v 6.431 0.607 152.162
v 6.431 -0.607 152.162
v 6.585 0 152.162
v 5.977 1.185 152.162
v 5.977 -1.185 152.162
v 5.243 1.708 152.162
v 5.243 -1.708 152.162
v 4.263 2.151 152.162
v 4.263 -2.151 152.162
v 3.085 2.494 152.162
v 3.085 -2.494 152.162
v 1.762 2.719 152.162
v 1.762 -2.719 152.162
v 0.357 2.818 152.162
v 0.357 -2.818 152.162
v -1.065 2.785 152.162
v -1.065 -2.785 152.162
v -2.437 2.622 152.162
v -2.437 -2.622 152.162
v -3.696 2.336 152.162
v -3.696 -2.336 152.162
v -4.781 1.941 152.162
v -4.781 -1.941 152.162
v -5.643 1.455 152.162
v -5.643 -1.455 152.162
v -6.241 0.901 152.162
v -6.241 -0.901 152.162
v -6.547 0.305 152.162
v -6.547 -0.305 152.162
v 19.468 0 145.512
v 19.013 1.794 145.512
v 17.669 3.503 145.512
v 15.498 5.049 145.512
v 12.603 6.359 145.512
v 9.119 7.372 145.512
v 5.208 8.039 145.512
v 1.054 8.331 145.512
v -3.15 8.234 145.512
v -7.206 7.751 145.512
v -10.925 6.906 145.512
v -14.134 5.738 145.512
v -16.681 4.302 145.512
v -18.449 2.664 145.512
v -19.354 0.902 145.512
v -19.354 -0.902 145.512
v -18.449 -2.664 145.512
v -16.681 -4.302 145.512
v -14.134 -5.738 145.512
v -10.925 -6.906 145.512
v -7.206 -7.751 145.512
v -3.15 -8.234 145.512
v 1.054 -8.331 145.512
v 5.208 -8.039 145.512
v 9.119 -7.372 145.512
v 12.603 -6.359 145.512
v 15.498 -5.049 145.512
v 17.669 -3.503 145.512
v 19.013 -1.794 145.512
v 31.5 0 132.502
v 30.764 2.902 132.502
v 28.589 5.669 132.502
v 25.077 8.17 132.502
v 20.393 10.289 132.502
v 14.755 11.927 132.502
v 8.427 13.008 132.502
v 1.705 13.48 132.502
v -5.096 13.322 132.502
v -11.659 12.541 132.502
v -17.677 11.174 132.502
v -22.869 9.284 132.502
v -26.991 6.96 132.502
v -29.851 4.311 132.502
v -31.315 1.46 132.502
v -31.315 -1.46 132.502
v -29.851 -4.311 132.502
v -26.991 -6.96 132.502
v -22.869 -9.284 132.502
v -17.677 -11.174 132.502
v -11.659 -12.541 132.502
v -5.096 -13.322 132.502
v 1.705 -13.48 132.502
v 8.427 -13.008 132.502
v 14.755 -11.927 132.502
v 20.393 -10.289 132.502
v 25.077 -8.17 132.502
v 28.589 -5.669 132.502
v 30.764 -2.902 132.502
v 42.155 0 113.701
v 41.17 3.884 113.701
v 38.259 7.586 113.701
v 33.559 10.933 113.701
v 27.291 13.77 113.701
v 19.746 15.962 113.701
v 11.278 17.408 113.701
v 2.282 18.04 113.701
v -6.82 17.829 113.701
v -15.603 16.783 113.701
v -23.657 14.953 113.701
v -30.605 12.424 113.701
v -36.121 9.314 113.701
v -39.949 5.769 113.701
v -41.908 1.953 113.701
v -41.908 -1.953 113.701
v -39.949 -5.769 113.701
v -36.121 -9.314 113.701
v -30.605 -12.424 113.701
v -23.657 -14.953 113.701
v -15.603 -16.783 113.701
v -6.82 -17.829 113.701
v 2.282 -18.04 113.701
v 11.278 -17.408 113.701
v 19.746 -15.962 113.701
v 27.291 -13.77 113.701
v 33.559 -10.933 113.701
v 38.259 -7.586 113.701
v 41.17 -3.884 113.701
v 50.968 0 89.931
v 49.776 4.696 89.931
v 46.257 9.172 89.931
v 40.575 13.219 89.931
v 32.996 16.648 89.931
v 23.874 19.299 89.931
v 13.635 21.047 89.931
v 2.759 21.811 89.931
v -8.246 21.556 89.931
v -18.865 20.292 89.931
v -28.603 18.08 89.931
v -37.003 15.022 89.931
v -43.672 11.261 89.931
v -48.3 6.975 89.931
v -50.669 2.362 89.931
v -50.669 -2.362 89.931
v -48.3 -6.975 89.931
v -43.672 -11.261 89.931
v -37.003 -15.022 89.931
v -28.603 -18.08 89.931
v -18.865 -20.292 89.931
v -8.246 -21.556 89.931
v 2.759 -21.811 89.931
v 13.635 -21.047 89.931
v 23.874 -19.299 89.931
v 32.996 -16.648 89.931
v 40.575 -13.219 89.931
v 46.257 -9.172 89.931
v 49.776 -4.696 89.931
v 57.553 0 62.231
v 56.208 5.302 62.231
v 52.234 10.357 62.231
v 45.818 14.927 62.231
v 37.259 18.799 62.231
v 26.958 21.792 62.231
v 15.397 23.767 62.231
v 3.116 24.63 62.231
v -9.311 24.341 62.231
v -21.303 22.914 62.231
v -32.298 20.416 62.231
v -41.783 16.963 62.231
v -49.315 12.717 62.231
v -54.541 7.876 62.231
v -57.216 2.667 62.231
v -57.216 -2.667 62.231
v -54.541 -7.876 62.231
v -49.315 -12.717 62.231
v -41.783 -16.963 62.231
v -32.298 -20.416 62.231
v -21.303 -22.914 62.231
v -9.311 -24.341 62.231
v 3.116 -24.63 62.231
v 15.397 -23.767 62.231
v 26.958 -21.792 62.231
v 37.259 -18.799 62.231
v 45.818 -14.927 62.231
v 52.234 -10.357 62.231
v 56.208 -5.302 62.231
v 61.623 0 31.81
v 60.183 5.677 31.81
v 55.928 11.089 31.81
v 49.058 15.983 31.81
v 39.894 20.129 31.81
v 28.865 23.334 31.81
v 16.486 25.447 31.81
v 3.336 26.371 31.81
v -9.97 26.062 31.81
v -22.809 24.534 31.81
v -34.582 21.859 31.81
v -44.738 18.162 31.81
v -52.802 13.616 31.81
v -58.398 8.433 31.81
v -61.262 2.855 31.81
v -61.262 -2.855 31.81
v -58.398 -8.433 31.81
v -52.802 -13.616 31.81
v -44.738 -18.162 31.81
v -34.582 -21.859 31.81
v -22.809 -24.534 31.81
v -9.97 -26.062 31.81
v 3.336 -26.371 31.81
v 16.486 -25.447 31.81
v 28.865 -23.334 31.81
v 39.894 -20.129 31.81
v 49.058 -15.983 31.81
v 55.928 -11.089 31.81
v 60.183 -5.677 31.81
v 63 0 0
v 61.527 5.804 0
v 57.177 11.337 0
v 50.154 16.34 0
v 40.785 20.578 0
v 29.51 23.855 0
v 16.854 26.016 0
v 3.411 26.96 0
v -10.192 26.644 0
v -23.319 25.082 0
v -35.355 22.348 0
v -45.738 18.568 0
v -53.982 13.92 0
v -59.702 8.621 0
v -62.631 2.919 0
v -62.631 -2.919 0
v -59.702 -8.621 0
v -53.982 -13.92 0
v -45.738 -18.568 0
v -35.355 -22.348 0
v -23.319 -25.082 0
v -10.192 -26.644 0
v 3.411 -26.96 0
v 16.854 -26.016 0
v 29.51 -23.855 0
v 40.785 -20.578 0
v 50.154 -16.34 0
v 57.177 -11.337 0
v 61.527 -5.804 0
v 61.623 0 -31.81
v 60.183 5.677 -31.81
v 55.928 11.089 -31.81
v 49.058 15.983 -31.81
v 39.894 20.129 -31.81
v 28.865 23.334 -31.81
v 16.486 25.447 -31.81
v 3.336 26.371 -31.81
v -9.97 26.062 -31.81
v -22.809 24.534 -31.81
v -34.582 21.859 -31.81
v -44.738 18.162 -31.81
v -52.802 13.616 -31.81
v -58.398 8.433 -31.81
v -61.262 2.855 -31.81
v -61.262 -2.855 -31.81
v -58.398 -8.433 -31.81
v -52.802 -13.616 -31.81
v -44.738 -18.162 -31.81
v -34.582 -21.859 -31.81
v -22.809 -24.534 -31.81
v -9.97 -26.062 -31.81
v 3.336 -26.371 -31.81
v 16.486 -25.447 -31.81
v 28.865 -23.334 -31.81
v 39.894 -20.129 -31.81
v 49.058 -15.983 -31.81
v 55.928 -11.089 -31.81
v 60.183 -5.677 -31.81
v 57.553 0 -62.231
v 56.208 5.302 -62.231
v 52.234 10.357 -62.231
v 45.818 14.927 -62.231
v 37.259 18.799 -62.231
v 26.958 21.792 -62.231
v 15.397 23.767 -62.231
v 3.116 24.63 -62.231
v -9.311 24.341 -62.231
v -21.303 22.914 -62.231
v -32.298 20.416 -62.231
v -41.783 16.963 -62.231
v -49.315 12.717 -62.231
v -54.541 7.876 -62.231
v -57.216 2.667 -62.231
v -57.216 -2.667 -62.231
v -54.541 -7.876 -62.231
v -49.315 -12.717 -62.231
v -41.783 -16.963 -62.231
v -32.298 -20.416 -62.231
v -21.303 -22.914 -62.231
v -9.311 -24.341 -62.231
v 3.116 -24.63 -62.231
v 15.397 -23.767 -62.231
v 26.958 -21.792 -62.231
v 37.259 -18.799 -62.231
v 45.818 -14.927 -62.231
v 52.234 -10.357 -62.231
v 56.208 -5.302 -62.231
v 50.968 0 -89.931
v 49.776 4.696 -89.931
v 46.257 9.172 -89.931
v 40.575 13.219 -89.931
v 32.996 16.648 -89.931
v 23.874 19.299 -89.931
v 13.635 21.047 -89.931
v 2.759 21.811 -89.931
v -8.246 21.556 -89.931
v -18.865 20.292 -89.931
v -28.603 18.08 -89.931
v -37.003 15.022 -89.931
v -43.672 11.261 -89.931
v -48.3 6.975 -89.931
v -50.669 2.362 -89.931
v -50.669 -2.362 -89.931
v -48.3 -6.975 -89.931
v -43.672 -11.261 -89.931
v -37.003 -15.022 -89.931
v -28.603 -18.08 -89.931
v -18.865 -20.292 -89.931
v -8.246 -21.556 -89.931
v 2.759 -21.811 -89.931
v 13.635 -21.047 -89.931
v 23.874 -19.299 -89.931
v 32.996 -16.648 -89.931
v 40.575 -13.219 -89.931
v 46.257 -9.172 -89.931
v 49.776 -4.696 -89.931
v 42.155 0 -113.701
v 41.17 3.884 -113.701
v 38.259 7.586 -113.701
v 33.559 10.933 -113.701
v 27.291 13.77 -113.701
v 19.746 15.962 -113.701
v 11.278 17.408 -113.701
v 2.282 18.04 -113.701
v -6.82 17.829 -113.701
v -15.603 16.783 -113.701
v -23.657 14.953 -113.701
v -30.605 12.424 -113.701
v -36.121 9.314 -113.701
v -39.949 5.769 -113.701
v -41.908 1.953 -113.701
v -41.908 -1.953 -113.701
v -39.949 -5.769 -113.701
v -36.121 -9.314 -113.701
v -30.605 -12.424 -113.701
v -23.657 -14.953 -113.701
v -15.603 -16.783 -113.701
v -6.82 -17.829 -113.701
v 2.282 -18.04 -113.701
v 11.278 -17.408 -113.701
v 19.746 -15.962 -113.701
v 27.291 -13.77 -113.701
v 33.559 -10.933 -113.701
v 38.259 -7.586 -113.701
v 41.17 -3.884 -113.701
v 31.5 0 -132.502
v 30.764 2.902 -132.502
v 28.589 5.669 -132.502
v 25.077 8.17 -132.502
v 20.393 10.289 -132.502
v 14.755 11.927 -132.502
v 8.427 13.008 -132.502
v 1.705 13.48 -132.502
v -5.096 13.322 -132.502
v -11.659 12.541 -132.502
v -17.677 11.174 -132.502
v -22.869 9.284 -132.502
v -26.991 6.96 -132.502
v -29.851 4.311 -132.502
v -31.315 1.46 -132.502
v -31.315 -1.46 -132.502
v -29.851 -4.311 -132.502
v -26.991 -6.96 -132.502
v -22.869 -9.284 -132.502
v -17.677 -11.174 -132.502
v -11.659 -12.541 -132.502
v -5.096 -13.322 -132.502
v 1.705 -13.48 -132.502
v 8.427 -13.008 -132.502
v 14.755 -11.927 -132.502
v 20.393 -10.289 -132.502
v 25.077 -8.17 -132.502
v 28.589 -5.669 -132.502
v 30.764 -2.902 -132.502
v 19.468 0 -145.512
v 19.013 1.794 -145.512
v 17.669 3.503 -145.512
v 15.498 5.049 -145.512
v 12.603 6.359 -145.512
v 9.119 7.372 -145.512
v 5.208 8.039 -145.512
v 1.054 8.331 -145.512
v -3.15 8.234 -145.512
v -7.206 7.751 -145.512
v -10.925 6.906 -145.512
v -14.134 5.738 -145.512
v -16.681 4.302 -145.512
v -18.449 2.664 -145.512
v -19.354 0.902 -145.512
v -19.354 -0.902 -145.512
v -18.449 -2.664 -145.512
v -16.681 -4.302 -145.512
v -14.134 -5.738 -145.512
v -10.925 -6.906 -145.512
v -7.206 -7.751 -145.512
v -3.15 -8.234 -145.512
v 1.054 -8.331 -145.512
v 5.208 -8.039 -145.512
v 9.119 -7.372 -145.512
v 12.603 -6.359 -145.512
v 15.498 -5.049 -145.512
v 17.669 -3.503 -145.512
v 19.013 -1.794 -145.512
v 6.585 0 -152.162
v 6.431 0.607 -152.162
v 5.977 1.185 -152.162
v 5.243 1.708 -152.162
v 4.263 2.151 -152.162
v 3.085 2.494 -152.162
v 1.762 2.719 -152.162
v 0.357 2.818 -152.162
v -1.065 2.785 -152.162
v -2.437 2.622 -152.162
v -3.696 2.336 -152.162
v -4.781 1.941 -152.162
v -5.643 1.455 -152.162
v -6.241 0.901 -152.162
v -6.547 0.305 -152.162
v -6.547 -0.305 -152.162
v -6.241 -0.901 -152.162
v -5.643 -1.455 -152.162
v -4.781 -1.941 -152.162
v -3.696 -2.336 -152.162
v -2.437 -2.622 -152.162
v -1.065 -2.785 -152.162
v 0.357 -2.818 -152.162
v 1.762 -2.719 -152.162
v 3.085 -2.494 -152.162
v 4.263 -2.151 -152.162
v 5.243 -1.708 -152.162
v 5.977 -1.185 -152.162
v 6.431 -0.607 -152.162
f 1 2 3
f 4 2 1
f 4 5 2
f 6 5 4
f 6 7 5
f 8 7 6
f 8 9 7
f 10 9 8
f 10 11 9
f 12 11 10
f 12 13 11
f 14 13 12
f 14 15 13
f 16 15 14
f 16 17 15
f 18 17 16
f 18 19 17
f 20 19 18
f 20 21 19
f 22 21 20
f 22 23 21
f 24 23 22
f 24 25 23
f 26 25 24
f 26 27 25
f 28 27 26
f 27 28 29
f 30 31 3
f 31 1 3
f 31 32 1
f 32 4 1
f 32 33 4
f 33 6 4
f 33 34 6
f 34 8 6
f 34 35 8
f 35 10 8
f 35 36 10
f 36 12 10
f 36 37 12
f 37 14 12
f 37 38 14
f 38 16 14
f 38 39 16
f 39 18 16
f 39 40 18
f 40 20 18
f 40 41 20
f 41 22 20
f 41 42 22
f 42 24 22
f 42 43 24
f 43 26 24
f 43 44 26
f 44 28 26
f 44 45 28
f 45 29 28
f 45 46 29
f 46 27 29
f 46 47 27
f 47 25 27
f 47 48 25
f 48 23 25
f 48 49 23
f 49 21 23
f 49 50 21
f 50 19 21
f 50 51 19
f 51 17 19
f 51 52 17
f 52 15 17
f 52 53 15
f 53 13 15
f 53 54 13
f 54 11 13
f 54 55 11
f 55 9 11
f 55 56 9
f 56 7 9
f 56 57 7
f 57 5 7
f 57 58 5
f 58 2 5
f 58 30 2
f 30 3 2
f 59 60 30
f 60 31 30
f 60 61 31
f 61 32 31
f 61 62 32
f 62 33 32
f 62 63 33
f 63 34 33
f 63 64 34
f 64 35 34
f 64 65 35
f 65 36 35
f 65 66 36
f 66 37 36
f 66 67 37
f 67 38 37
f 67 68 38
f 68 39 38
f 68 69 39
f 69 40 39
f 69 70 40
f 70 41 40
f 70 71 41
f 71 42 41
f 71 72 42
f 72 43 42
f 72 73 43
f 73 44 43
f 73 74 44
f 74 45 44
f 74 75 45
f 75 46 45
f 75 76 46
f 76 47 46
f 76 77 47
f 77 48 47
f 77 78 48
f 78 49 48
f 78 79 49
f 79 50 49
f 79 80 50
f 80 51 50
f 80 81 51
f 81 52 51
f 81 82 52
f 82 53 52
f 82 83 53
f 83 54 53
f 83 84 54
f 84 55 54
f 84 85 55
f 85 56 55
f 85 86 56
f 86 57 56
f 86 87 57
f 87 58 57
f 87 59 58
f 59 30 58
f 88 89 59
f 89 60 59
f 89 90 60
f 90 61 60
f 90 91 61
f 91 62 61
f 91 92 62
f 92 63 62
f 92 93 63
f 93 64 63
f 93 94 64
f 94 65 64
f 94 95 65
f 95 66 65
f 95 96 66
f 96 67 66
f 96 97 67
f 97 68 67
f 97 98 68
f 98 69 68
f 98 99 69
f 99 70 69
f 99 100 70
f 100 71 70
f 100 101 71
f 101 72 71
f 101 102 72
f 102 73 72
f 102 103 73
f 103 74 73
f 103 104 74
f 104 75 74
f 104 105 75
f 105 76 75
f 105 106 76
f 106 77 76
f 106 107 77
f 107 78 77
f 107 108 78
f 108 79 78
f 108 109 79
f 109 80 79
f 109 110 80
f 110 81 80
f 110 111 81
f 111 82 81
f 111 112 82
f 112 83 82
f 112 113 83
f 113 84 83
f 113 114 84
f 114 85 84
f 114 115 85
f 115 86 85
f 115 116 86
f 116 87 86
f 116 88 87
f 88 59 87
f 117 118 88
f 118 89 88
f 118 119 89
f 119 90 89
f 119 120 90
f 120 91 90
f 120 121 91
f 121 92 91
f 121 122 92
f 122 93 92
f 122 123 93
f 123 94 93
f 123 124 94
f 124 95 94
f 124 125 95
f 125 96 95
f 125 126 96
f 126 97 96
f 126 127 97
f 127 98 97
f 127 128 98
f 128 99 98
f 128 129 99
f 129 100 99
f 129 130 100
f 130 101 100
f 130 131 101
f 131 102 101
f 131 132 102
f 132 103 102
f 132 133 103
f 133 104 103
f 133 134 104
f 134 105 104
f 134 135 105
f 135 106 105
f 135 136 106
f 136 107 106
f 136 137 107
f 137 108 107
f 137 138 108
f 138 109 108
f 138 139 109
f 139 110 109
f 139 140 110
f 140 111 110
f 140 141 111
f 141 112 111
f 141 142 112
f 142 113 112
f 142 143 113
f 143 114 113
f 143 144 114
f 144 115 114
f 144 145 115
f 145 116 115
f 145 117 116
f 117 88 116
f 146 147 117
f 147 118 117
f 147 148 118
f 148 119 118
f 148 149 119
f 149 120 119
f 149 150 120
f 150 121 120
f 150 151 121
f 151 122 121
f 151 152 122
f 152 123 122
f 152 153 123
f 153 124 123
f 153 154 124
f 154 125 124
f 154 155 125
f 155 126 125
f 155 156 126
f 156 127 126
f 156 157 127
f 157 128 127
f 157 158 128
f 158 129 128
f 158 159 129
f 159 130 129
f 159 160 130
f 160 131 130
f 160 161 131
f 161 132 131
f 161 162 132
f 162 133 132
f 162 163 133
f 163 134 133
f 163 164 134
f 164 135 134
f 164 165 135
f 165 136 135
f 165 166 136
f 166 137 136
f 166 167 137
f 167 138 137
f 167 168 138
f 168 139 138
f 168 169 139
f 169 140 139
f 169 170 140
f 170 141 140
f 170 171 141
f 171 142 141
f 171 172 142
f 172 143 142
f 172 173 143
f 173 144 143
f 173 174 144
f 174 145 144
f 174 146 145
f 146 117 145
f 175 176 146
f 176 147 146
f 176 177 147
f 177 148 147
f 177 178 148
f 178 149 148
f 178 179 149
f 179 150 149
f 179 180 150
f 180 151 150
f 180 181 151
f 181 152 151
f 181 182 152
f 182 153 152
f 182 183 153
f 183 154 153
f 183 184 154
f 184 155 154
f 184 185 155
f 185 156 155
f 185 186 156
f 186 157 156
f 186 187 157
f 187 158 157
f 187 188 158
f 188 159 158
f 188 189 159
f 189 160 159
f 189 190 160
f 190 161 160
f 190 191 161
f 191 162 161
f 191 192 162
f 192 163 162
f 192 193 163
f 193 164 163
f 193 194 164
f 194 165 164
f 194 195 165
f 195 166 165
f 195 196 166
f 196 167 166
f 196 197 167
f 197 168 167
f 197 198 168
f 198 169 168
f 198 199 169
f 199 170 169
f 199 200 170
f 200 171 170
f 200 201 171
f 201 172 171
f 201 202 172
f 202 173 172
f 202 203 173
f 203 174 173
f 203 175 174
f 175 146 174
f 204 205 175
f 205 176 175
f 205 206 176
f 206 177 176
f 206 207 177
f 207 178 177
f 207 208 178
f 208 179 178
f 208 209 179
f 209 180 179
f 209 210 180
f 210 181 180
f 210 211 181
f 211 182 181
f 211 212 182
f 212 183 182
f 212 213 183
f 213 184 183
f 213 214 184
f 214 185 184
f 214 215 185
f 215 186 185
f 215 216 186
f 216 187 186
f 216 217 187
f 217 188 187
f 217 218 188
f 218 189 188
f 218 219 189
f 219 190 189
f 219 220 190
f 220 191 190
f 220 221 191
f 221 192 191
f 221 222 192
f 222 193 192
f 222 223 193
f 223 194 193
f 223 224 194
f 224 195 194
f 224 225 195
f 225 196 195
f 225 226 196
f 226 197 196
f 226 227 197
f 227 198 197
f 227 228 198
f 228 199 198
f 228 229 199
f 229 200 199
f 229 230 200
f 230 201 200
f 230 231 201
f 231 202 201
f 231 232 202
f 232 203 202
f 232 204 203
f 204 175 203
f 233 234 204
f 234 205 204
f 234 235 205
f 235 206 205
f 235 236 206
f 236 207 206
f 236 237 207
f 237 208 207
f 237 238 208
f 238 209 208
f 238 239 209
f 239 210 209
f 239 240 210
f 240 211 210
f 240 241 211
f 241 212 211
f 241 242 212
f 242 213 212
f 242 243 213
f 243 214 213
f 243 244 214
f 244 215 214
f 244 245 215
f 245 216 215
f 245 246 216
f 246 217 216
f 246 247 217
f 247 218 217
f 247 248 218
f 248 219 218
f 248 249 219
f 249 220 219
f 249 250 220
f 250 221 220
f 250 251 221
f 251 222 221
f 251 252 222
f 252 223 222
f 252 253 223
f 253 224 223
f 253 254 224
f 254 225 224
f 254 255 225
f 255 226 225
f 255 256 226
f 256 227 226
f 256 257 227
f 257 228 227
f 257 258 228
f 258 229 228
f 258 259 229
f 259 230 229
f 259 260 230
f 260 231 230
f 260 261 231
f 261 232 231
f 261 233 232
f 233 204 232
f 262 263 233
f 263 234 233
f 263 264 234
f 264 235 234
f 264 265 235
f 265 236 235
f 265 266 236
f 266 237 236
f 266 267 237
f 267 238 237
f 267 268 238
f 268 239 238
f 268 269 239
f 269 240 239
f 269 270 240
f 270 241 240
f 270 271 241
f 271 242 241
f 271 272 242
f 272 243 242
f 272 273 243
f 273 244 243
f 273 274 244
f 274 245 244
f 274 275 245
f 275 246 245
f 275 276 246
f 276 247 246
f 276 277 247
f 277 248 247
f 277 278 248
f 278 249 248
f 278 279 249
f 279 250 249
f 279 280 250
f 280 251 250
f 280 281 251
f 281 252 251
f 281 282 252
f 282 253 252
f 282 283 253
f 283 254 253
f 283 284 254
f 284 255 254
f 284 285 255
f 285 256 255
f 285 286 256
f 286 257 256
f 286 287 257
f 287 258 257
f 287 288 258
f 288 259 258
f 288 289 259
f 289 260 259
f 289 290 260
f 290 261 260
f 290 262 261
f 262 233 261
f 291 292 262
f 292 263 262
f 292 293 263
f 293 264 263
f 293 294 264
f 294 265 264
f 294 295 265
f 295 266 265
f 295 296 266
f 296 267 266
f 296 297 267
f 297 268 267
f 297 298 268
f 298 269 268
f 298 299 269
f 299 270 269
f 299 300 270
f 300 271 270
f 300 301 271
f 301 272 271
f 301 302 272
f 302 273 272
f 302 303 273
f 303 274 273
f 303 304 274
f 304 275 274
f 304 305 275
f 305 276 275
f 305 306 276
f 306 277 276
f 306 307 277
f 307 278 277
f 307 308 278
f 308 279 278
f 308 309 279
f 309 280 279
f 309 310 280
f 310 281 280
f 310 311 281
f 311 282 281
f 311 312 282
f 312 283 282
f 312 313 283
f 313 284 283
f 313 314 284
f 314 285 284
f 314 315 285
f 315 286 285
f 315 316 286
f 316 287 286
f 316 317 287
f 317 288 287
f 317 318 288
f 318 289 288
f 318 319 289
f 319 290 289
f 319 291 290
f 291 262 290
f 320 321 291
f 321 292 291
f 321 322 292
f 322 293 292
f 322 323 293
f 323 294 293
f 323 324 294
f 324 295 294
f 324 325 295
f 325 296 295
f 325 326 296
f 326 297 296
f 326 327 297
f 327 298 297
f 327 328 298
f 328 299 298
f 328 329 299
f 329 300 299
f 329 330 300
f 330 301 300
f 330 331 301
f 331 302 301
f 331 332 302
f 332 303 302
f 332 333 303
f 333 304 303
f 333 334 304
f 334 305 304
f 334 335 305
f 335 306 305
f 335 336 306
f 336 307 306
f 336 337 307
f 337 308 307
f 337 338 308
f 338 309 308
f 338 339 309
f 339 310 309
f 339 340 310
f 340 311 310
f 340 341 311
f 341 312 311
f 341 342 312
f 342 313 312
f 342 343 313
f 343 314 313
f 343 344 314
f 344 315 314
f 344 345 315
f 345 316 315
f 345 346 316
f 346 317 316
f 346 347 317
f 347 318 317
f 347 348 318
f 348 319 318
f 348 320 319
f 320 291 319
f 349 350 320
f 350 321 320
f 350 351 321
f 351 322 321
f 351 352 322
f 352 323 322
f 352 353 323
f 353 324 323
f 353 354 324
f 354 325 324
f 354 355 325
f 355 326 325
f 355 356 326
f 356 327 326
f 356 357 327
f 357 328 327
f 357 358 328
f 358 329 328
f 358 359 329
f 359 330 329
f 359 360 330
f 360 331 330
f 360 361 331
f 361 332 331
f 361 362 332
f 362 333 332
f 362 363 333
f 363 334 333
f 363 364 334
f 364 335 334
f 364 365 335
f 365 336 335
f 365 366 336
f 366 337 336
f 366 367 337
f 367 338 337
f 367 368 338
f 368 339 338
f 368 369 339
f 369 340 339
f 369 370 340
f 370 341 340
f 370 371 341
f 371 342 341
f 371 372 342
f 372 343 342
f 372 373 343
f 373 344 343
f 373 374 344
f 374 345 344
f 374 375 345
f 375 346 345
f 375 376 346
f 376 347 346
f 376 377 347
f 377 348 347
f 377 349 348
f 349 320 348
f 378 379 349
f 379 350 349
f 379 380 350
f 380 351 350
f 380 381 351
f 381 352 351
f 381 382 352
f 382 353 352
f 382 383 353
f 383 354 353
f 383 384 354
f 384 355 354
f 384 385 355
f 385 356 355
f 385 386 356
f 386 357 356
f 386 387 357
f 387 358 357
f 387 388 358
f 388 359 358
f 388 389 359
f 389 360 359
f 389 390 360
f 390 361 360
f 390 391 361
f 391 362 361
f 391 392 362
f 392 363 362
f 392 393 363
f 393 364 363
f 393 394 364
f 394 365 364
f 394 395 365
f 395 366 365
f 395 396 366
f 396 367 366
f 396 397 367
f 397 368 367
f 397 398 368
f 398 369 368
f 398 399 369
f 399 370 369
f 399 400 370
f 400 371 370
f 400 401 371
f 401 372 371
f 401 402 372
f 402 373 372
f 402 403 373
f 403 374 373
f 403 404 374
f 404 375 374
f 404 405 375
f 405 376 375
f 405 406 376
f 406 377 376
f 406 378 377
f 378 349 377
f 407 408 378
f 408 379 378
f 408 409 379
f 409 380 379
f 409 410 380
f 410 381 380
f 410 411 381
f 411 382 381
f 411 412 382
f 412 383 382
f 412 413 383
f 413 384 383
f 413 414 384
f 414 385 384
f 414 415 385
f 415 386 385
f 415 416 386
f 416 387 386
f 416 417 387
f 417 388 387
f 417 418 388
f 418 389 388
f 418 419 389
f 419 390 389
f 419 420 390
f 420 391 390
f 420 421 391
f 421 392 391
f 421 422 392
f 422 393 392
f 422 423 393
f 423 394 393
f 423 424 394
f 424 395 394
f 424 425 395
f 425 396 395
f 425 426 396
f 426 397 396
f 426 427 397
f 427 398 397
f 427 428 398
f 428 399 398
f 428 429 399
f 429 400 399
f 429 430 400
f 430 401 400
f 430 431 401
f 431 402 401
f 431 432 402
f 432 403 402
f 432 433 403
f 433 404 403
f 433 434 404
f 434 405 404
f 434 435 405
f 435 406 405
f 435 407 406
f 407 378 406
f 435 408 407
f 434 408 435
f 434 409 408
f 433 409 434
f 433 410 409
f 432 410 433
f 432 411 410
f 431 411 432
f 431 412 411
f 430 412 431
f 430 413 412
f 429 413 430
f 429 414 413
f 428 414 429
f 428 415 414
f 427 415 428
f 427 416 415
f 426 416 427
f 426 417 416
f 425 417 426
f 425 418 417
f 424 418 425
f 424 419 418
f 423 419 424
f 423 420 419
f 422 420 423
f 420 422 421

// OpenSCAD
// Generated by SolidPython 1.0.1 on 2020-07-29 00:46:47


scale(v = [7, 3, 17]) {
	sphere(r = 9);
}
/***********************************************
*********      SolidPython code:      **********
************************************************
 
# import packages: SolidPython
from solid import *
from solid.utils import *
from itertools import chain, combinations, permutations


class Resize:

    def __init__(self, scad_file):
        self.scad_file = scad_file
        #self.scad_file = import_scad(scad_file)
        # cone/cylinder param:
        self.r1 = 0
        self.r2 = 0
        self.h = 0
        # rectangular prism param:
        self.w = 0
        self.l = 0
        # ellipse param:
        self.r = 0

    # import OpenScad code (file name corresponds to shape)


    # classify shape + parameters
    def assign(self, param1, param2, param3):
        if self.scad_file == 'cone.scad':
            self.r1 = param1
            self.r2 = param2
            self.h = param3
        elif self.scad_file == 'cylinder.scad':
            self.r1 = param1
            self.r2 = param2
            self.h = param3
        elif self.scad_file == 'rectangularPrism.scad':
            self.h = param1
            self.l = param2
            self.w = param3
        else:
            self.r = param1
            self.h = param2

    # resize parameters
    def iterate(self):
        x = range(3, 20, 2)
        i = 1
        if self.scad_file == 'cone.scad':
            tempList = list(permutations(x, 2))
            for temp in tempList:
                param1 = temp[0]
                param2 = temp[1]
                filepath = 'produced_scad_files/' + 'cone' + str(param1) + '_' + str(param2) + '_' + '.scad'
                scad_render_to_file(cylinder(h=param1, r1=param2, r2=0), filepath)

        elif self.scad_file == 'cylinder.scad':
            tempList = list(permutations(x, 3))
            for temp in tempList:
                param1 = temp[0]
                param2 = temp[1]
                filepath = 'produced_scad_files/' + 'cylinder' + str(param1) + '_' + str(param2) + '_' + '.scad'
                scad_render_to_file(cylinder(h=param1, r1=param2, r2=param2), filepath)

        elif self.scad_file == 'rectangularPrism.scad':
            tempList = list(permutations(x, 3))
            for temp in tempList:
                param1 = temp[0]
                param2 = temp[1]
                param3 = temp[2]
                filepath = 'produced_scad_files/' + 'rectangularPrism' + str(param1) + '_' + str(param2) + '_' + str(
                    param3) + '.scad'
                scad_render_to_file(cube(size=(param1, param2, param3)), filepath)

        elif self.scad_file == 'ellipse.scad':
            tempList = list(permutations(x, 4))
            for temp in tempList:
                param1 = temp[0]
                param2 = temp[1]
                param3 = temp[2]
                param4 = temp[3]
                filepath = 'produced_scad_files/' + 'ellipse' + str(param1) + '_' + str(param2) + '_' + str(param3) + '_' + str(param4) + '.scad'
                scad_render_to_file(scale([param1, param2, param3])(sphere(r=param4)), filepath)

    def render_to_scadfile(self):
        scad_render_to_file(scad, 'example.scad') 
 
************************************************/
